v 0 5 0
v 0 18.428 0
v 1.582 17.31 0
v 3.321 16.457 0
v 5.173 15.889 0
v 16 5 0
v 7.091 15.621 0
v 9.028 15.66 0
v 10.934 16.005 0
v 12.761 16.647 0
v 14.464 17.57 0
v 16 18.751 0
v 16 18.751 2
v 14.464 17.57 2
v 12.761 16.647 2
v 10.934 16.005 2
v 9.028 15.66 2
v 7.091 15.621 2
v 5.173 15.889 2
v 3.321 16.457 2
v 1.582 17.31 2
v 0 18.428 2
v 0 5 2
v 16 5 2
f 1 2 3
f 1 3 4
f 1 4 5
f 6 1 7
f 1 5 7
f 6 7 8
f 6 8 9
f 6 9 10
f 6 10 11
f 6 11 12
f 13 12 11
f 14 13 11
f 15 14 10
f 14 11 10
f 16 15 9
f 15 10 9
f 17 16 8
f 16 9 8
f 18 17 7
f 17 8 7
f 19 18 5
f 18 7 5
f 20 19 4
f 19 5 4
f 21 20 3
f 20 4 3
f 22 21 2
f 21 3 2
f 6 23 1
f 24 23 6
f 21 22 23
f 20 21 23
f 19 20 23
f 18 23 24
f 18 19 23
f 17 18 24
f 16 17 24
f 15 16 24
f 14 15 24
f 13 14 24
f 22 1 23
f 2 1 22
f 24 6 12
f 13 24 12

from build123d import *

# Parameters (mm, degrees)
SZKIC1_W                    = 16
SZKIC1_H                    = 31.855734842
DODANIE_WYCI_GNI_CIE1_DEPTH = 2
SZKIC2_W                    = 16
SZKIC2_H                    = 5
WYTNIJ_WYCI_GNI_CIE1_DEPTH  = 5
WYTNIJ_WYCI_GNI_CIE2_DEPTH  = 10


with BuildPart() as part:
    # Szkic1 → Dodanie-wyciągnięcie1 (new body)
    with BuildSketch(Plane.XY):
        with Locations((8, 15.927867421)):
            Rectangle(SZKIC1_W, SZKIC1_H)
    extrude(amount=DODANIE_WYCI_GNI_CIE1_DEPTH)

    # Szkic2 → Wytnij-wyciągnięcie1 (cut)
    with BuildSketch(Plane.XY.offset(2)):
        with Locations((8, 2.5)):
            Rectangle(SZKIC2_W, SZKIC2_H)
    extrude(amount=-WYTNIJ_WYCI_GNI_CIE1_DEPTH, mode=Mode.SUBTRACT)

    # Szkic6 → Wytnij-wyciągnięcie2 (cut)
    with BuildSketch(Plane(origin=(0, 0, 0), x_dir=(-1, 0, 0), z_dir=(0, 0, -1))):
        with BuildLine():
            Line((0, 31.855734842), (-16, 31.855734842))
            Line((-16, 31.855734842), (-16, 18.750886073))
            ThreePointArc((-16, 18.750886073), (-8.06030582, 15.602264045), (0, 18.427867421))
            Line((0, 18.427867421), (0, 31.855734842))
        make_face()
    extrude(amount=-WYTNIJ_WYCI_GNI_CIE2_DEPTH, mode=Mode.SUBTRACT)


solid = part.part
